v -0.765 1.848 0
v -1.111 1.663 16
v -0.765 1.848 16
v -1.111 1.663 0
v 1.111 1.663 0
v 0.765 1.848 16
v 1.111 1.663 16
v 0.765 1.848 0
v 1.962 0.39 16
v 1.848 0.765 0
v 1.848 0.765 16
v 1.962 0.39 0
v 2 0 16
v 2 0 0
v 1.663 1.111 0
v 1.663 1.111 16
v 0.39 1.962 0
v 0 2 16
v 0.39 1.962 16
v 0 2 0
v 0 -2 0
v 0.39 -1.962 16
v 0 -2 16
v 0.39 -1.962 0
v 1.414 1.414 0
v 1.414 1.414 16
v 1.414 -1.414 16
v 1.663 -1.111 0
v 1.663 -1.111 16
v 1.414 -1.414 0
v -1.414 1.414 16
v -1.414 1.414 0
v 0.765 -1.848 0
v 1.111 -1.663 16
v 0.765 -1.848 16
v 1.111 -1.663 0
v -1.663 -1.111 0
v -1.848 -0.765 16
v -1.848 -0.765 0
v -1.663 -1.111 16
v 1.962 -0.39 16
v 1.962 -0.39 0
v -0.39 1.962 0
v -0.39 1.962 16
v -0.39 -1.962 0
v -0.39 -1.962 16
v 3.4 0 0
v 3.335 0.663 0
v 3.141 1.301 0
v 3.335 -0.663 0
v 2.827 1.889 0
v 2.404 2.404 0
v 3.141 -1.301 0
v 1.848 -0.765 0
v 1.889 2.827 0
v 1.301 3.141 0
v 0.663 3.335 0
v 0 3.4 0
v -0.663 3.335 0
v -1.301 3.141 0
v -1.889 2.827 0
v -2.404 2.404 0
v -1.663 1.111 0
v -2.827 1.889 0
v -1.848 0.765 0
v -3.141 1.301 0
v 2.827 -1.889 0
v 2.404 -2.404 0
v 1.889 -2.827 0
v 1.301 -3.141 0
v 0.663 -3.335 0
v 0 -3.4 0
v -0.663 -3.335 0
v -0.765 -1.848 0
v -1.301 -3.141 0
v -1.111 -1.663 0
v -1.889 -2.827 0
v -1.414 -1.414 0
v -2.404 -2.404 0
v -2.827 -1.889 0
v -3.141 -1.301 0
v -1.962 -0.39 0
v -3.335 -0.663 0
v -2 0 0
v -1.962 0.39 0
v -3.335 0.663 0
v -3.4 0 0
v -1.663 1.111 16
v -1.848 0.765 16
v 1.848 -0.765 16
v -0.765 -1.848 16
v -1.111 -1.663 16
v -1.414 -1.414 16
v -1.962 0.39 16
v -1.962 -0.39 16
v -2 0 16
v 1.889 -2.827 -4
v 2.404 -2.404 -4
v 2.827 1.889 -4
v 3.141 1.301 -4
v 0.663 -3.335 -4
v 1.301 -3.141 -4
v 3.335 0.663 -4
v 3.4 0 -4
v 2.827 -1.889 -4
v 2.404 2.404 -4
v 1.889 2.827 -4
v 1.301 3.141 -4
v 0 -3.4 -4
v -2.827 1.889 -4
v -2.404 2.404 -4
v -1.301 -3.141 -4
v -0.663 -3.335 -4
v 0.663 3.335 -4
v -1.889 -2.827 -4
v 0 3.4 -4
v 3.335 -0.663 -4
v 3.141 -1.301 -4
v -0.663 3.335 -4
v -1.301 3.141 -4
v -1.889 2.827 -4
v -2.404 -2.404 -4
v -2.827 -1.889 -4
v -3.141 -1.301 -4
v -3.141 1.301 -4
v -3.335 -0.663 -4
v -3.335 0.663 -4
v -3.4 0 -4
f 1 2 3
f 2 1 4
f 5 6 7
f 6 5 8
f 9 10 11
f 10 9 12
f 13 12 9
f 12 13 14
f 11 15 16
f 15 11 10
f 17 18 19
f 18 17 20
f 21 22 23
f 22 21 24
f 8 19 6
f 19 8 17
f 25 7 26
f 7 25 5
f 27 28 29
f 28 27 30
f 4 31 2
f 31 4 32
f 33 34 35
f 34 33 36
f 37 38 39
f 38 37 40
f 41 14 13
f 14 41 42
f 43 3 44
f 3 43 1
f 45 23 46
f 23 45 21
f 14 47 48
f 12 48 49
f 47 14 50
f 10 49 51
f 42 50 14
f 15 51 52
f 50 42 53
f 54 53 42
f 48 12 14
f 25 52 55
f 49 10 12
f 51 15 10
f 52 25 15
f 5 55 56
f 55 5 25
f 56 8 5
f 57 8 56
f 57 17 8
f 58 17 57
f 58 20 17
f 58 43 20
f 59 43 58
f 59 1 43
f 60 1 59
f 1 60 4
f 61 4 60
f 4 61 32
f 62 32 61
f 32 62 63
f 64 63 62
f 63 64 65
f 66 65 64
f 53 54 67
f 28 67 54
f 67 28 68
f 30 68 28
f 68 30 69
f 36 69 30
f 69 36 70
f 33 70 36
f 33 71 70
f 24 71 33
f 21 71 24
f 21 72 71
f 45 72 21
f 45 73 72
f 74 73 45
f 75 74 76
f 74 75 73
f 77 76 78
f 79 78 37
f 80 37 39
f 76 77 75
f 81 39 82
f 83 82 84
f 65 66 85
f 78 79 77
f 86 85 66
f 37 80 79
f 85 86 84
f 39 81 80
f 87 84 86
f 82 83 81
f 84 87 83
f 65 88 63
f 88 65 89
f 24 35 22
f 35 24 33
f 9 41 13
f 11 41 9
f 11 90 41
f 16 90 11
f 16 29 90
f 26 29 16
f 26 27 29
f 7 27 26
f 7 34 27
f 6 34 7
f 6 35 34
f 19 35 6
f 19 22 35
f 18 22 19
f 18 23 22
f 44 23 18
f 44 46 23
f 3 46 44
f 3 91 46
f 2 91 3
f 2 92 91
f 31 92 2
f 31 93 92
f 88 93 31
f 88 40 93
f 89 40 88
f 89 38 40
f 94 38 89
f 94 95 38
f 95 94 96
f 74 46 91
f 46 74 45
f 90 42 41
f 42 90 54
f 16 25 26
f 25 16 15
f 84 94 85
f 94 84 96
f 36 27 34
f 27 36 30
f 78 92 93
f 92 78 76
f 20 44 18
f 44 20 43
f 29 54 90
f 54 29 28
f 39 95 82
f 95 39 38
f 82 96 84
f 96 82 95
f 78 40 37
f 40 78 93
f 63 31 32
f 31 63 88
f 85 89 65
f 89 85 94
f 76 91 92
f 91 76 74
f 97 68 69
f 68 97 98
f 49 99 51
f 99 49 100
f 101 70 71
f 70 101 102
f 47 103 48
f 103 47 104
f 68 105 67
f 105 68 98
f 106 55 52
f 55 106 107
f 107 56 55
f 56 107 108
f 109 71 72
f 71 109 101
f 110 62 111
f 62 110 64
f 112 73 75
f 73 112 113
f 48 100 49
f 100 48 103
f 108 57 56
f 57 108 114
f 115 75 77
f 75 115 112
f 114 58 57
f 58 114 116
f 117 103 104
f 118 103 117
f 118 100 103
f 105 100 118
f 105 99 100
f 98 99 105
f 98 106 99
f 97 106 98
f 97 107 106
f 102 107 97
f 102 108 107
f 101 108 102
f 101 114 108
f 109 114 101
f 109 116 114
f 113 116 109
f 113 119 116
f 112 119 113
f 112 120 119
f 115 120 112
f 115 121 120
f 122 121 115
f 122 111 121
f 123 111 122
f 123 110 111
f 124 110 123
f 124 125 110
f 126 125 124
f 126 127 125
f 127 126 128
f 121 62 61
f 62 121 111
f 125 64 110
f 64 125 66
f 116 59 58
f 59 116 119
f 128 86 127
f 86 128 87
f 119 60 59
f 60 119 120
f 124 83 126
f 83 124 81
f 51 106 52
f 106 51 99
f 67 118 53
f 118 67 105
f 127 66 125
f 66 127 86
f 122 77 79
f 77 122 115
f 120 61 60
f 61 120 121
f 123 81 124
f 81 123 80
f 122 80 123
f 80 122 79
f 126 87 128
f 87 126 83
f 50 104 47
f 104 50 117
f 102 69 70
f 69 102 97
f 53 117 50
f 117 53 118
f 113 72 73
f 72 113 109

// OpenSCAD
// Purchased hardware envelope; no modeled threads, not print.
$fn=32;
union(){cylinder(d=4,h=16);translate([0,0,-4])cylinder(d=6.8,h=4);}
